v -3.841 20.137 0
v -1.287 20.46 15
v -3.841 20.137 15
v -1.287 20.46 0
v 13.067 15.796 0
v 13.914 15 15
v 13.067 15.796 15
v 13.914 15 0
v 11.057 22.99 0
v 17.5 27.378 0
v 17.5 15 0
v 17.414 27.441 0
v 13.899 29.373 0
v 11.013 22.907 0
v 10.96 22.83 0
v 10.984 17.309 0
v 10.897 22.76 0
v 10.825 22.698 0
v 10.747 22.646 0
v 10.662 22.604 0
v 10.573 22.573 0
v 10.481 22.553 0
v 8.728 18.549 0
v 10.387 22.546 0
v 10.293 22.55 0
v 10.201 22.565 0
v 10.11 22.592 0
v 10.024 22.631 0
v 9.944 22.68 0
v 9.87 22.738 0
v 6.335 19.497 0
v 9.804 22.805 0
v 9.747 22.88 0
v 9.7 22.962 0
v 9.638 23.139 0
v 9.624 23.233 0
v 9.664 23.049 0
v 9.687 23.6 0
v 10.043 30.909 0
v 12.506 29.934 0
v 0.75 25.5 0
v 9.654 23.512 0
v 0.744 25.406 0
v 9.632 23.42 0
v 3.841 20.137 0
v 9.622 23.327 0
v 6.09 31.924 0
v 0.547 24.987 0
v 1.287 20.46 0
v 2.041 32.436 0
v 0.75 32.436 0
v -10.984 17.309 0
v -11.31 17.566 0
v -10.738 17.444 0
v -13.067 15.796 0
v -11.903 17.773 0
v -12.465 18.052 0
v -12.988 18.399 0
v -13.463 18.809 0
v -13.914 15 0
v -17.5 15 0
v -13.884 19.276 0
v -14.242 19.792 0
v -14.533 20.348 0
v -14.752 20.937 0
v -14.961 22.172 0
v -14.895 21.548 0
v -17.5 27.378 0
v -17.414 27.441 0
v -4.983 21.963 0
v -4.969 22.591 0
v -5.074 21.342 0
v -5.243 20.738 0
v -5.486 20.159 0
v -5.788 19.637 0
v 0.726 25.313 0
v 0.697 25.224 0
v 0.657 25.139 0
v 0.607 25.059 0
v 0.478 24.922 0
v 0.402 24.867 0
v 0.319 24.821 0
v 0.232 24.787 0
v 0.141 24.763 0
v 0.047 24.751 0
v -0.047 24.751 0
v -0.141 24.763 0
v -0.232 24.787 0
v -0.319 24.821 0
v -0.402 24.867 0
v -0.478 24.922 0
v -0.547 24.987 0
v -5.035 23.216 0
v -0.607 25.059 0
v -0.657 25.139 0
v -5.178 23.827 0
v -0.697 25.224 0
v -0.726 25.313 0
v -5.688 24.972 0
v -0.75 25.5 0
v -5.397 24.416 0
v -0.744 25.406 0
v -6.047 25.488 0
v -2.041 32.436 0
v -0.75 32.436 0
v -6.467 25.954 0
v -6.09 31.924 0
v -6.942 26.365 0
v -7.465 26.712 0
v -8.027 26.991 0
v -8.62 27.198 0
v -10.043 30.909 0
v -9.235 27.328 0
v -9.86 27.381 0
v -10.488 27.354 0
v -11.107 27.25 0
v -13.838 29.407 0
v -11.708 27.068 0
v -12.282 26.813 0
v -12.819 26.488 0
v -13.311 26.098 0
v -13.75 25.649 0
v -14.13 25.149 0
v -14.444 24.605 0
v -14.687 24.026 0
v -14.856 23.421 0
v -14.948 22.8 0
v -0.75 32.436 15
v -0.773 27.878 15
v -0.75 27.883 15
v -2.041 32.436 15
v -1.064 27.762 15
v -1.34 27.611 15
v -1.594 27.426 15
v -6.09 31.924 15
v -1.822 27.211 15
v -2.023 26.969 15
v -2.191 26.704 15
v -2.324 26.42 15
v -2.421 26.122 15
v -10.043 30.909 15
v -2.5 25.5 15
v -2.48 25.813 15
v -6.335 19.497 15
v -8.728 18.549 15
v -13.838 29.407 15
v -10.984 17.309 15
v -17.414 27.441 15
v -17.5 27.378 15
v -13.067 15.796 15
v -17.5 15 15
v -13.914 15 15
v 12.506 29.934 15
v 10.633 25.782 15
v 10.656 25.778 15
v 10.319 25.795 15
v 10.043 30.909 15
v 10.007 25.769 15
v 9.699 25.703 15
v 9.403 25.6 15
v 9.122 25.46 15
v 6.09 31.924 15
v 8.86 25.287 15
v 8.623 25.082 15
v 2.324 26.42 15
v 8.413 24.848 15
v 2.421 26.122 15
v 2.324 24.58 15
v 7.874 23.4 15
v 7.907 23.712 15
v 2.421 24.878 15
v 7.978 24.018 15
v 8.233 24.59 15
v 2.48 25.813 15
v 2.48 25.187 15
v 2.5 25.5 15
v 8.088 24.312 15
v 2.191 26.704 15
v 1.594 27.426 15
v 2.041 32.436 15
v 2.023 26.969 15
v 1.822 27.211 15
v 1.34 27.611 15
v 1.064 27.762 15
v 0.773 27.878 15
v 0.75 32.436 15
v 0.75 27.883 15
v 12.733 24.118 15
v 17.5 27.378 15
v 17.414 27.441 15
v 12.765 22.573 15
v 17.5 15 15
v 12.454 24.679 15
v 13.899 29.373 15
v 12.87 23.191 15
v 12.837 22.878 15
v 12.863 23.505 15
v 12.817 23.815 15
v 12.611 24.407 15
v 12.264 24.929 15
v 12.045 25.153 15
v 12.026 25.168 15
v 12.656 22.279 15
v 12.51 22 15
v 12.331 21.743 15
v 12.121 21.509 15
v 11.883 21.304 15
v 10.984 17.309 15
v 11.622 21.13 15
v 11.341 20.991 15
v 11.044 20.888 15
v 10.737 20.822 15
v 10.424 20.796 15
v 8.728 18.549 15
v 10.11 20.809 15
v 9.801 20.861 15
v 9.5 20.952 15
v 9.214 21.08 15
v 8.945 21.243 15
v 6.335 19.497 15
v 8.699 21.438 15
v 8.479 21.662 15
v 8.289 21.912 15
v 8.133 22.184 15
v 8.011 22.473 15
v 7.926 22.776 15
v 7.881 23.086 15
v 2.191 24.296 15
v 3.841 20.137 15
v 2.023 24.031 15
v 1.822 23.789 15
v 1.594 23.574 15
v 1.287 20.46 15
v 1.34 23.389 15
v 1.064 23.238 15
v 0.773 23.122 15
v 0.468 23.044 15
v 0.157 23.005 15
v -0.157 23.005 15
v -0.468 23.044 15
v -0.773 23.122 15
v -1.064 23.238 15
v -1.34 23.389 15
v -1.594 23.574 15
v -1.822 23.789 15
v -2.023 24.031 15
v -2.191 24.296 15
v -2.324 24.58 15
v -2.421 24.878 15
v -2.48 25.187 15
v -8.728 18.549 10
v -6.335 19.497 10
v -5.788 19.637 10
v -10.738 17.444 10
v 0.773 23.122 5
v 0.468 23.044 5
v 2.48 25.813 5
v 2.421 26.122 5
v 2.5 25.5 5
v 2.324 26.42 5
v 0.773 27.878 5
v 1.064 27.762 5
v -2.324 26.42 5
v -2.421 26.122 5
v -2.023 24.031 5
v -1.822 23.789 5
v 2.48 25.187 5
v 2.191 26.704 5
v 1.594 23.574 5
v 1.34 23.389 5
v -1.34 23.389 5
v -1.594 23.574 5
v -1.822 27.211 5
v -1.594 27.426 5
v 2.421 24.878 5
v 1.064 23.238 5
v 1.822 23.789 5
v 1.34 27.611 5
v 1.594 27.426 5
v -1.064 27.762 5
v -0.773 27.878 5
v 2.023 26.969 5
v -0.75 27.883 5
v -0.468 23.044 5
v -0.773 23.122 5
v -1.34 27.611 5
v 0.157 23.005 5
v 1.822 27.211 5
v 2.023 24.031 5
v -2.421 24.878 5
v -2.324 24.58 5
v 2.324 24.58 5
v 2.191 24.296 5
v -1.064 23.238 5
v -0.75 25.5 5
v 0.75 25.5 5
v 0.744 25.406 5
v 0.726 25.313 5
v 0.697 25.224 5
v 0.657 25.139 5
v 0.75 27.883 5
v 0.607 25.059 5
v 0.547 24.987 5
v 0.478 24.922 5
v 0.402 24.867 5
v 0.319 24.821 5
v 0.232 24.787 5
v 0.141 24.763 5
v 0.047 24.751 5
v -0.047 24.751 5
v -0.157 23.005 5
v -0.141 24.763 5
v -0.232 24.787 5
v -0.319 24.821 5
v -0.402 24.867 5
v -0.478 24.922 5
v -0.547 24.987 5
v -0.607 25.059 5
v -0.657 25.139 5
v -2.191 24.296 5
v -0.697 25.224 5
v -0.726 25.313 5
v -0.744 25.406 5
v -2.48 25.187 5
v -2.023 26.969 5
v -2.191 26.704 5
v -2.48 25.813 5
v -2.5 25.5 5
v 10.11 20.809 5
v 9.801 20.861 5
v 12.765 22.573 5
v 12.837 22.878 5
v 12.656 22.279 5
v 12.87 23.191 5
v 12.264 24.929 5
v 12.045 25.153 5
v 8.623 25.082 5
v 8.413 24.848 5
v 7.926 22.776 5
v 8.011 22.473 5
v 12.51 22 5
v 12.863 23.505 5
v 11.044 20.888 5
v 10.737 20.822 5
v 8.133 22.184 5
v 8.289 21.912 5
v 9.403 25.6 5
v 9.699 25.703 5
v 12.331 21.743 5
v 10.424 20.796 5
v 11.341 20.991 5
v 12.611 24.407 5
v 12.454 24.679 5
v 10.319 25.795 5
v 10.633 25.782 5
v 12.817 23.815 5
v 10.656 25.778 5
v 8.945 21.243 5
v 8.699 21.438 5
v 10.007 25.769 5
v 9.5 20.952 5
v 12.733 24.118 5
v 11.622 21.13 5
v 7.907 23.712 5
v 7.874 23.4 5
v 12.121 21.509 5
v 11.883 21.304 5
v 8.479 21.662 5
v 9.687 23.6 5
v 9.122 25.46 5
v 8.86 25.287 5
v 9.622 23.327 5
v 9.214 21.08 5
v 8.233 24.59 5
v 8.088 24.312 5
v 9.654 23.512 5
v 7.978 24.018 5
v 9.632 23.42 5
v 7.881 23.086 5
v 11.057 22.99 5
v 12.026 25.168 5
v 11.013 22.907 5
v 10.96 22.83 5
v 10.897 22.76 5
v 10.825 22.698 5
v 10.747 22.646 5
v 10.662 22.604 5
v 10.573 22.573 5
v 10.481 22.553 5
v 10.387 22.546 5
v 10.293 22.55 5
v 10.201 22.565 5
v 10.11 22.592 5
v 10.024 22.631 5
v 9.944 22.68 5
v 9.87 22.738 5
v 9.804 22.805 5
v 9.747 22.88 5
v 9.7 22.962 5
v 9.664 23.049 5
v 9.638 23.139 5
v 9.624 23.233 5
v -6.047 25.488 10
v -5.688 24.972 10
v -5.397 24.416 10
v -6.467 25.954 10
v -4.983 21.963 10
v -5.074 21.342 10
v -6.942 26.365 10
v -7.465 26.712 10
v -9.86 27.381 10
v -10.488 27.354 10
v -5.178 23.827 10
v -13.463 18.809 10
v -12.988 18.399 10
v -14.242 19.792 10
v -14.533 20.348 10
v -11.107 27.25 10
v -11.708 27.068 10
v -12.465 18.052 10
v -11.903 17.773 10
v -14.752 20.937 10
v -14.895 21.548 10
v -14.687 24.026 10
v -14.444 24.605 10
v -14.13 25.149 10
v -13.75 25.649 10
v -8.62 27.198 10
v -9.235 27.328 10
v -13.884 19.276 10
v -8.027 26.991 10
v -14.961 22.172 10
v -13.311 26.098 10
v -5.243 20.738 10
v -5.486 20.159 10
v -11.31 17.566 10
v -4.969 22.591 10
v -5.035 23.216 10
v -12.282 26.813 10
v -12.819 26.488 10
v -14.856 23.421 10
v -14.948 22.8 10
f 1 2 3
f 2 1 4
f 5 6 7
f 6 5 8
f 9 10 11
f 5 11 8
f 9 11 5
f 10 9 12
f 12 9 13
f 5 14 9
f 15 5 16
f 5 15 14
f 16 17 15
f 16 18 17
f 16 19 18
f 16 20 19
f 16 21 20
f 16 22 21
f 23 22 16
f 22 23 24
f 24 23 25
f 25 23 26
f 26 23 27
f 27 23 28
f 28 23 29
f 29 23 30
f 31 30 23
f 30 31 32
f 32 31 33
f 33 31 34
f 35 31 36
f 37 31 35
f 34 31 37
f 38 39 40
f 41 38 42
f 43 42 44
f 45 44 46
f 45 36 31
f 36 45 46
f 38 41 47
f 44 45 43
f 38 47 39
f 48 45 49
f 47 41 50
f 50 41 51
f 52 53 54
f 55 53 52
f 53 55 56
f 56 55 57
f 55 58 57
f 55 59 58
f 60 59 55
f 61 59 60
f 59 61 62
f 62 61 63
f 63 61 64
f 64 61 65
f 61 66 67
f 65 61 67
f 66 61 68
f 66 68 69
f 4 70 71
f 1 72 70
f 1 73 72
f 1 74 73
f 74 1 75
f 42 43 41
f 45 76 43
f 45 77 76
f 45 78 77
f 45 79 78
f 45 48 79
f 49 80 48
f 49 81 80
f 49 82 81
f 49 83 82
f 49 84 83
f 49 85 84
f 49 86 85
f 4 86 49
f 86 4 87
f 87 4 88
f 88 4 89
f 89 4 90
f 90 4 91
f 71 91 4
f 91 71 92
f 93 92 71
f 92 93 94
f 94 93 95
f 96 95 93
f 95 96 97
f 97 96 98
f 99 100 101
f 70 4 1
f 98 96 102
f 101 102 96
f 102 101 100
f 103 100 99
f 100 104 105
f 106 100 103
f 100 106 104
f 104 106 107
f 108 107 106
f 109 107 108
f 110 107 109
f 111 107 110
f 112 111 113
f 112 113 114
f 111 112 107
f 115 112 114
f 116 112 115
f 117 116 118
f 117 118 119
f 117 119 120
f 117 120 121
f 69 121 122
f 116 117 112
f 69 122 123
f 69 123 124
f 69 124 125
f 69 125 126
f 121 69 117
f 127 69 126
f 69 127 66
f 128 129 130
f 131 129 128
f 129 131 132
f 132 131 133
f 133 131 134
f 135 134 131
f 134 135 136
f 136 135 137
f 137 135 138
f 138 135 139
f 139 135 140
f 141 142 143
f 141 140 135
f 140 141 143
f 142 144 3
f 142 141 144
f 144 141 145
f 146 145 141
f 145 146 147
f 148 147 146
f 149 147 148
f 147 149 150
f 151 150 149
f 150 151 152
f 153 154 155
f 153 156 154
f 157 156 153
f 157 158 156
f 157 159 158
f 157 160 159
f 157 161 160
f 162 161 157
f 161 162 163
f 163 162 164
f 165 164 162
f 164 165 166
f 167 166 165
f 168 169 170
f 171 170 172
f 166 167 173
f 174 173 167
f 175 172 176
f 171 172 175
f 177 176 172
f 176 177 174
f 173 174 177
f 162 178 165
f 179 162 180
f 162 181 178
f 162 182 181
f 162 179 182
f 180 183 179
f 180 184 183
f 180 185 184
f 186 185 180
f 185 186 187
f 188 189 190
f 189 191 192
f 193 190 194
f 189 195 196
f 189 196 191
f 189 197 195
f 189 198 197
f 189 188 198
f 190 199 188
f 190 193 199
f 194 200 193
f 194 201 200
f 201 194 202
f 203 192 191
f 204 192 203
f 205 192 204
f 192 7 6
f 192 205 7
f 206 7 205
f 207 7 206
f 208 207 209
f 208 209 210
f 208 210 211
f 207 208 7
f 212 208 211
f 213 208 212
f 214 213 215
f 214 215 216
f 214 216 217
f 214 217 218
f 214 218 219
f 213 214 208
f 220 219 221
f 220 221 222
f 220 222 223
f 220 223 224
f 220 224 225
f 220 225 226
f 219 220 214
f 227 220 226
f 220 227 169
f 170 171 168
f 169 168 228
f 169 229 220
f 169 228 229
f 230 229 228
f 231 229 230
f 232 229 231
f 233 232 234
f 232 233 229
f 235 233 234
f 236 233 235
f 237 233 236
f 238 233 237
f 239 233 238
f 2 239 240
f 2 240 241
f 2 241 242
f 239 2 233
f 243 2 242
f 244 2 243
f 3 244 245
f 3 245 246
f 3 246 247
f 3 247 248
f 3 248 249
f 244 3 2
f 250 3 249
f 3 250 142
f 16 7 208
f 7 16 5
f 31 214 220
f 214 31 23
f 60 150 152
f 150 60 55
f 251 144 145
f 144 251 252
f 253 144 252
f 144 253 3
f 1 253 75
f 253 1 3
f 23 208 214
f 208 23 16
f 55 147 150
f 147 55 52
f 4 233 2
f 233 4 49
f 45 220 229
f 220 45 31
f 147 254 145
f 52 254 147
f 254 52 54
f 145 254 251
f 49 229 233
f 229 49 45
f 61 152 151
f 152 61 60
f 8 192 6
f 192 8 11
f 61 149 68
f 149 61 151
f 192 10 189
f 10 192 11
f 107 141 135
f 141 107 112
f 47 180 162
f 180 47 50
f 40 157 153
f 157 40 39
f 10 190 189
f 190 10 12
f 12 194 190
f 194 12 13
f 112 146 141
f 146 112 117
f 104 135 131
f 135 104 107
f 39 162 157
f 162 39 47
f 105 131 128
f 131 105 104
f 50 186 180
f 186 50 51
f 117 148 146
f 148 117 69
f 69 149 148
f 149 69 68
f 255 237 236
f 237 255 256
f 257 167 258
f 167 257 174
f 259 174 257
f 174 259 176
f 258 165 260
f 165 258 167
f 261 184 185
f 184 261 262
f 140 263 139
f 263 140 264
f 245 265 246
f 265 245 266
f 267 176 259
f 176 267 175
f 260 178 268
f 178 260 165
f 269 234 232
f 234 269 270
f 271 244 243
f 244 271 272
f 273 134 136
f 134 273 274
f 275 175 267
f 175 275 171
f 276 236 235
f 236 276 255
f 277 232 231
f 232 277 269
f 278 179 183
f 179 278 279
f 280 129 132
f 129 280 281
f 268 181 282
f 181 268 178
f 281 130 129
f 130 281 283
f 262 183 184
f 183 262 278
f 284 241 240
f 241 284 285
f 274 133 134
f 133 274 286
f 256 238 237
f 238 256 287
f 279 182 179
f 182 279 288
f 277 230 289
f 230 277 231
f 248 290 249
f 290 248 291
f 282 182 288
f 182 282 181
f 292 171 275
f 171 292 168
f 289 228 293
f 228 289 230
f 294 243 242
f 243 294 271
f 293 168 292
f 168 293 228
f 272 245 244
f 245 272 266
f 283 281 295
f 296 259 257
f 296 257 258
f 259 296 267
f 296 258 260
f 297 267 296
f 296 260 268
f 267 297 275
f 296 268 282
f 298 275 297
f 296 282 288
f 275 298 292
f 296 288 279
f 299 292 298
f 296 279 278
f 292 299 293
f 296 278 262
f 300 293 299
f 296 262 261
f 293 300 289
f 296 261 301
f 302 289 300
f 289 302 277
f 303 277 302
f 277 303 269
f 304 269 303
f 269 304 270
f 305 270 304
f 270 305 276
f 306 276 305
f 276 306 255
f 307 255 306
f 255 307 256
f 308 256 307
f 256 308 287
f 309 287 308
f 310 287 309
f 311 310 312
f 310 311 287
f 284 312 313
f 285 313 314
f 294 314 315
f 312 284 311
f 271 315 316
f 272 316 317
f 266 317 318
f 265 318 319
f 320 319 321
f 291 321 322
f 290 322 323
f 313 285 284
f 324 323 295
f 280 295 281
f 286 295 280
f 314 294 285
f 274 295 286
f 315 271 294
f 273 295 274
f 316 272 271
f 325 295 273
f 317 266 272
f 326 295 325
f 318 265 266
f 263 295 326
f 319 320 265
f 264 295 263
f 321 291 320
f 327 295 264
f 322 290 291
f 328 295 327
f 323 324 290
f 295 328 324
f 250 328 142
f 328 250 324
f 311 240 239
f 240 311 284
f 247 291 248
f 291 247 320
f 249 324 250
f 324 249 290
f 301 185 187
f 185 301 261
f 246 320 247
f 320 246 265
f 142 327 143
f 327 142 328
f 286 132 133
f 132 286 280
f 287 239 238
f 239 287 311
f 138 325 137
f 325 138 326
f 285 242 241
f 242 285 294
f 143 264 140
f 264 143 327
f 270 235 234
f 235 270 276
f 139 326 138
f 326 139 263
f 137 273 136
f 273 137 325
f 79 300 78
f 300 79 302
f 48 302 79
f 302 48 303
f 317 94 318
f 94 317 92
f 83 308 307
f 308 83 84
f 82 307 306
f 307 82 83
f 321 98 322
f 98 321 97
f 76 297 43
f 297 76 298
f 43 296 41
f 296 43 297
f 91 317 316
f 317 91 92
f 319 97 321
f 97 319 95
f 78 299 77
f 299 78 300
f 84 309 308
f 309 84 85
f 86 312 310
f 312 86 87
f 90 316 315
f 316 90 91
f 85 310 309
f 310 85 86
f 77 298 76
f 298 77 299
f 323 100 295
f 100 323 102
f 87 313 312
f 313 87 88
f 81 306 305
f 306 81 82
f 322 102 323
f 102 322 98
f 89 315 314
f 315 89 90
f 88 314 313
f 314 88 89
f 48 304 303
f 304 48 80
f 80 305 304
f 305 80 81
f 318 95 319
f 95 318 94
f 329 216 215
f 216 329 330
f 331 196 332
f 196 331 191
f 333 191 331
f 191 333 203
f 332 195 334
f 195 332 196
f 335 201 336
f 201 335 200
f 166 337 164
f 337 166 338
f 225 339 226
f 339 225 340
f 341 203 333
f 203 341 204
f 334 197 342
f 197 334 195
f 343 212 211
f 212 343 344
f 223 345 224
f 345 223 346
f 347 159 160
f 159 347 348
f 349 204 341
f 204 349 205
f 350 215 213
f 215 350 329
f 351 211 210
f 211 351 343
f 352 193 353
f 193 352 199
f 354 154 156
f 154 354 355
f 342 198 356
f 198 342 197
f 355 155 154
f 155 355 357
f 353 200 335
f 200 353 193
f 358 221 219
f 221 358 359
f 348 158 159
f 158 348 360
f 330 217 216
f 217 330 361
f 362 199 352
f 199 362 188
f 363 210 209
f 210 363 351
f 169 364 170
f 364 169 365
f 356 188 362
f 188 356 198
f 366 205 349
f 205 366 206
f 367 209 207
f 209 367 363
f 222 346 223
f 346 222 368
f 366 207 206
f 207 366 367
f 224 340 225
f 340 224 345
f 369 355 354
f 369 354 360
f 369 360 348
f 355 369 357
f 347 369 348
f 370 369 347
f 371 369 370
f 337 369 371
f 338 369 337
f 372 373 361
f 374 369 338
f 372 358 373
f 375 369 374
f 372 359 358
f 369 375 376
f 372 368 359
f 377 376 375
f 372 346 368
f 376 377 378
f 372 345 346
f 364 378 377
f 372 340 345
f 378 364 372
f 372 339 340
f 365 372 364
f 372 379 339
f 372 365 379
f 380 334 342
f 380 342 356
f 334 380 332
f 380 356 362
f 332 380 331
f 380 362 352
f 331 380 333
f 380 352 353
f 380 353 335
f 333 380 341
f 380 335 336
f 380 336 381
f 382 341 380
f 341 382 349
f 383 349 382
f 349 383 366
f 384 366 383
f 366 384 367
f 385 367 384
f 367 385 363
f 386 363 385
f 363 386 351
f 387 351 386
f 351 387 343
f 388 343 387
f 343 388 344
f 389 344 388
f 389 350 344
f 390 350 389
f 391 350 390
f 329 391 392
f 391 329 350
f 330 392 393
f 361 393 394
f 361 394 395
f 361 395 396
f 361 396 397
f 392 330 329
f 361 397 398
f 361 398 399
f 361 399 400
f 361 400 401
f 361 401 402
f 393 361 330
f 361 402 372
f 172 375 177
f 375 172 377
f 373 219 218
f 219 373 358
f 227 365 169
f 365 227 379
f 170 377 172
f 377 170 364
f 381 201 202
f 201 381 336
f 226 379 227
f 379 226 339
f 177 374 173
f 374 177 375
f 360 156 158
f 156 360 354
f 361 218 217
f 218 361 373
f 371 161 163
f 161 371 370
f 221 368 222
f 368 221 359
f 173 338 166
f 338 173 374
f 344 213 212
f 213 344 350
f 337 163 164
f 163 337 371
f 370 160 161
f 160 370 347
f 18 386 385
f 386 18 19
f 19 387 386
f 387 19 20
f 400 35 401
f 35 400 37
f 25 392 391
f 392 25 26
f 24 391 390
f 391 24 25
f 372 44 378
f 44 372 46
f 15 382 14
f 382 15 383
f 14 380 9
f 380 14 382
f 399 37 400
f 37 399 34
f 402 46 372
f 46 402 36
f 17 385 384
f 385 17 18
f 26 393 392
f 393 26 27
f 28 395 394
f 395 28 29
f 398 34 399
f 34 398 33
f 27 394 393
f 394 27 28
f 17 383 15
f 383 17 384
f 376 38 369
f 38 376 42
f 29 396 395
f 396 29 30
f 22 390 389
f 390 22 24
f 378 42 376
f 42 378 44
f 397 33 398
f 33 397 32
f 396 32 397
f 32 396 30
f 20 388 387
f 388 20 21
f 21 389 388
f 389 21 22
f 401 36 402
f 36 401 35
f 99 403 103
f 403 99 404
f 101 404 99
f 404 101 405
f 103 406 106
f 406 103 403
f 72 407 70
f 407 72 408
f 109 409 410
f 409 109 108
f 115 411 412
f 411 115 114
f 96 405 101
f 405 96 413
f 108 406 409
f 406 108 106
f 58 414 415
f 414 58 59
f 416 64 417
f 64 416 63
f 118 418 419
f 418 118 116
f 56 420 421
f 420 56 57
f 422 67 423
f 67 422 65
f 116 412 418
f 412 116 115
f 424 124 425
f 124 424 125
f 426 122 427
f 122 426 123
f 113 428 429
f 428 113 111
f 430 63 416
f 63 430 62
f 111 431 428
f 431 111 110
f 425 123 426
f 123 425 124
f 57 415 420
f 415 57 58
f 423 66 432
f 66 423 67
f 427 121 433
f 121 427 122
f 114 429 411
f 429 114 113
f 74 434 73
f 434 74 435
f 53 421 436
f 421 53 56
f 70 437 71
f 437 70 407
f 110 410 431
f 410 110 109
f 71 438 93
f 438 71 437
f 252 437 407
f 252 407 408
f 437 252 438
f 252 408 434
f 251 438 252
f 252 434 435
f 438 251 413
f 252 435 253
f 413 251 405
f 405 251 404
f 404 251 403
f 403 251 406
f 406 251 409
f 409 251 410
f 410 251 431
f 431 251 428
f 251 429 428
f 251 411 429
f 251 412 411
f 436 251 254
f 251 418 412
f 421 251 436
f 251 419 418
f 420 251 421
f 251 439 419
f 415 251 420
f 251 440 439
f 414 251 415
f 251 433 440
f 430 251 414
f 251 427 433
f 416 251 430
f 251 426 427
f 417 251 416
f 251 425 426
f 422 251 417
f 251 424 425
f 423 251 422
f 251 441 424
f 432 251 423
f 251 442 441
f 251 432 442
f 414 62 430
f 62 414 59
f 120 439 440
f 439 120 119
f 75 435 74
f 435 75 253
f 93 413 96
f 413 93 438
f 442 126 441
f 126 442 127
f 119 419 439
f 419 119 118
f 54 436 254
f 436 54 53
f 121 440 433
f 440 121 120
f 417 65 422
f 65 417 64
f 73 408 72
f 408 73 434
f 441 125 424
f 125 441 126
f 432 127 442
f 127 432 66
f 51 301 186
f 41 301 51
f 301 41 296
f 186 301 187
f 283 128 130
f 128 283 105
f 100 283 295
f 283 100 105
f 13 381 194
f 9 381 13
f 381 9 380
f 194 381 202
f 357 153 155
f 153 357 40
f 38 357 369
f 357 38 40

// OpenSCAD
//bike frame tube diameters
D1=41; // original


//small hole diameters
d1=5; // shifter cable housing
d2=6; 
d3=10; //the one clamp that is welded to the frame
$fn=50;


module shape_1(d_inner, d_outer, z){
    
    //D2 = D1 + 2* d3 + 4; //outer tube (for topmost bound)
    //Z = 15;
    SIDE_OFFS = 3;
    
    difference() {
        color("red")
        cylinder(d=d_outer, h=z);

        union() {
            //tube diameter
            color("blue")
            cylinder(d=d_inner, h=z);
            
            //bottom bound 
            translate([-(d_outer/2), -50,0])
            cube([d_outer, d_outer, z]);

            //left bound
            translate([-(d_inner/2)-20 + SIDE_OFFS,0,0])
                cube([20, d_outer, z]);

            //right bound
            translate([d_inner/2 - SIDE_OFFS,0,0])
                cube([20, d_outer, z]);
            
        }
    }
}

module cutout(z){
    zz = 10; //existing hole
    CUTOUT = 1.5;
    
    //left
    rotate([0,0,24])
    translate([0,(D1+d3)/2-1,0]) {        
//        translate([0,0,2]) {
//            cylinder(d=d1, h=z);                        
//        }
        cylinder(d=d3, h=zz);
//        cylinder(d=CUTOUT, h=z);
    }
    
    //rotate([0,0,24])
    //translate([-CUTOUT/2,(D1+d3)/2,0]) 
    //cube([CUTOUT,d3,z]);

    
    //middle
    translate([0,(D1+d3)/2,0]){
        translate([0,0,5]) {
            cylinder(d=d1, h=z);
        }
        cylinder(d=CUTOUT, h=z);
    }
        
    translate([-CUTOUT/2,(D1+d3)/2,0]) 
    cube([CUTOUT,d3,z]);
    
    //right

    rotate([0,0,-24])
    translate([0,(D1+d3)/2,0]){
        translate([0,0,5]) {
            cylinder(d=d1, h=z);
        }
        cylinder(d=CUTOUT, h=z);
    }

    rotate([0,0,-24])
    translate([-CUTOUT/2,(D1+d3)/2,0]) 
    cube([CUTOUT,d3,z]);

}



Z = 15;

difference(){
   shape_1(D1, D1 + 2* d3 + 4, Z);
    cutout(Z);
}

//translate([0,0,Z])
//shape_1(D1, D1 + 4, 4);

//color("red")
//cylinder(d=D1, h=15);
